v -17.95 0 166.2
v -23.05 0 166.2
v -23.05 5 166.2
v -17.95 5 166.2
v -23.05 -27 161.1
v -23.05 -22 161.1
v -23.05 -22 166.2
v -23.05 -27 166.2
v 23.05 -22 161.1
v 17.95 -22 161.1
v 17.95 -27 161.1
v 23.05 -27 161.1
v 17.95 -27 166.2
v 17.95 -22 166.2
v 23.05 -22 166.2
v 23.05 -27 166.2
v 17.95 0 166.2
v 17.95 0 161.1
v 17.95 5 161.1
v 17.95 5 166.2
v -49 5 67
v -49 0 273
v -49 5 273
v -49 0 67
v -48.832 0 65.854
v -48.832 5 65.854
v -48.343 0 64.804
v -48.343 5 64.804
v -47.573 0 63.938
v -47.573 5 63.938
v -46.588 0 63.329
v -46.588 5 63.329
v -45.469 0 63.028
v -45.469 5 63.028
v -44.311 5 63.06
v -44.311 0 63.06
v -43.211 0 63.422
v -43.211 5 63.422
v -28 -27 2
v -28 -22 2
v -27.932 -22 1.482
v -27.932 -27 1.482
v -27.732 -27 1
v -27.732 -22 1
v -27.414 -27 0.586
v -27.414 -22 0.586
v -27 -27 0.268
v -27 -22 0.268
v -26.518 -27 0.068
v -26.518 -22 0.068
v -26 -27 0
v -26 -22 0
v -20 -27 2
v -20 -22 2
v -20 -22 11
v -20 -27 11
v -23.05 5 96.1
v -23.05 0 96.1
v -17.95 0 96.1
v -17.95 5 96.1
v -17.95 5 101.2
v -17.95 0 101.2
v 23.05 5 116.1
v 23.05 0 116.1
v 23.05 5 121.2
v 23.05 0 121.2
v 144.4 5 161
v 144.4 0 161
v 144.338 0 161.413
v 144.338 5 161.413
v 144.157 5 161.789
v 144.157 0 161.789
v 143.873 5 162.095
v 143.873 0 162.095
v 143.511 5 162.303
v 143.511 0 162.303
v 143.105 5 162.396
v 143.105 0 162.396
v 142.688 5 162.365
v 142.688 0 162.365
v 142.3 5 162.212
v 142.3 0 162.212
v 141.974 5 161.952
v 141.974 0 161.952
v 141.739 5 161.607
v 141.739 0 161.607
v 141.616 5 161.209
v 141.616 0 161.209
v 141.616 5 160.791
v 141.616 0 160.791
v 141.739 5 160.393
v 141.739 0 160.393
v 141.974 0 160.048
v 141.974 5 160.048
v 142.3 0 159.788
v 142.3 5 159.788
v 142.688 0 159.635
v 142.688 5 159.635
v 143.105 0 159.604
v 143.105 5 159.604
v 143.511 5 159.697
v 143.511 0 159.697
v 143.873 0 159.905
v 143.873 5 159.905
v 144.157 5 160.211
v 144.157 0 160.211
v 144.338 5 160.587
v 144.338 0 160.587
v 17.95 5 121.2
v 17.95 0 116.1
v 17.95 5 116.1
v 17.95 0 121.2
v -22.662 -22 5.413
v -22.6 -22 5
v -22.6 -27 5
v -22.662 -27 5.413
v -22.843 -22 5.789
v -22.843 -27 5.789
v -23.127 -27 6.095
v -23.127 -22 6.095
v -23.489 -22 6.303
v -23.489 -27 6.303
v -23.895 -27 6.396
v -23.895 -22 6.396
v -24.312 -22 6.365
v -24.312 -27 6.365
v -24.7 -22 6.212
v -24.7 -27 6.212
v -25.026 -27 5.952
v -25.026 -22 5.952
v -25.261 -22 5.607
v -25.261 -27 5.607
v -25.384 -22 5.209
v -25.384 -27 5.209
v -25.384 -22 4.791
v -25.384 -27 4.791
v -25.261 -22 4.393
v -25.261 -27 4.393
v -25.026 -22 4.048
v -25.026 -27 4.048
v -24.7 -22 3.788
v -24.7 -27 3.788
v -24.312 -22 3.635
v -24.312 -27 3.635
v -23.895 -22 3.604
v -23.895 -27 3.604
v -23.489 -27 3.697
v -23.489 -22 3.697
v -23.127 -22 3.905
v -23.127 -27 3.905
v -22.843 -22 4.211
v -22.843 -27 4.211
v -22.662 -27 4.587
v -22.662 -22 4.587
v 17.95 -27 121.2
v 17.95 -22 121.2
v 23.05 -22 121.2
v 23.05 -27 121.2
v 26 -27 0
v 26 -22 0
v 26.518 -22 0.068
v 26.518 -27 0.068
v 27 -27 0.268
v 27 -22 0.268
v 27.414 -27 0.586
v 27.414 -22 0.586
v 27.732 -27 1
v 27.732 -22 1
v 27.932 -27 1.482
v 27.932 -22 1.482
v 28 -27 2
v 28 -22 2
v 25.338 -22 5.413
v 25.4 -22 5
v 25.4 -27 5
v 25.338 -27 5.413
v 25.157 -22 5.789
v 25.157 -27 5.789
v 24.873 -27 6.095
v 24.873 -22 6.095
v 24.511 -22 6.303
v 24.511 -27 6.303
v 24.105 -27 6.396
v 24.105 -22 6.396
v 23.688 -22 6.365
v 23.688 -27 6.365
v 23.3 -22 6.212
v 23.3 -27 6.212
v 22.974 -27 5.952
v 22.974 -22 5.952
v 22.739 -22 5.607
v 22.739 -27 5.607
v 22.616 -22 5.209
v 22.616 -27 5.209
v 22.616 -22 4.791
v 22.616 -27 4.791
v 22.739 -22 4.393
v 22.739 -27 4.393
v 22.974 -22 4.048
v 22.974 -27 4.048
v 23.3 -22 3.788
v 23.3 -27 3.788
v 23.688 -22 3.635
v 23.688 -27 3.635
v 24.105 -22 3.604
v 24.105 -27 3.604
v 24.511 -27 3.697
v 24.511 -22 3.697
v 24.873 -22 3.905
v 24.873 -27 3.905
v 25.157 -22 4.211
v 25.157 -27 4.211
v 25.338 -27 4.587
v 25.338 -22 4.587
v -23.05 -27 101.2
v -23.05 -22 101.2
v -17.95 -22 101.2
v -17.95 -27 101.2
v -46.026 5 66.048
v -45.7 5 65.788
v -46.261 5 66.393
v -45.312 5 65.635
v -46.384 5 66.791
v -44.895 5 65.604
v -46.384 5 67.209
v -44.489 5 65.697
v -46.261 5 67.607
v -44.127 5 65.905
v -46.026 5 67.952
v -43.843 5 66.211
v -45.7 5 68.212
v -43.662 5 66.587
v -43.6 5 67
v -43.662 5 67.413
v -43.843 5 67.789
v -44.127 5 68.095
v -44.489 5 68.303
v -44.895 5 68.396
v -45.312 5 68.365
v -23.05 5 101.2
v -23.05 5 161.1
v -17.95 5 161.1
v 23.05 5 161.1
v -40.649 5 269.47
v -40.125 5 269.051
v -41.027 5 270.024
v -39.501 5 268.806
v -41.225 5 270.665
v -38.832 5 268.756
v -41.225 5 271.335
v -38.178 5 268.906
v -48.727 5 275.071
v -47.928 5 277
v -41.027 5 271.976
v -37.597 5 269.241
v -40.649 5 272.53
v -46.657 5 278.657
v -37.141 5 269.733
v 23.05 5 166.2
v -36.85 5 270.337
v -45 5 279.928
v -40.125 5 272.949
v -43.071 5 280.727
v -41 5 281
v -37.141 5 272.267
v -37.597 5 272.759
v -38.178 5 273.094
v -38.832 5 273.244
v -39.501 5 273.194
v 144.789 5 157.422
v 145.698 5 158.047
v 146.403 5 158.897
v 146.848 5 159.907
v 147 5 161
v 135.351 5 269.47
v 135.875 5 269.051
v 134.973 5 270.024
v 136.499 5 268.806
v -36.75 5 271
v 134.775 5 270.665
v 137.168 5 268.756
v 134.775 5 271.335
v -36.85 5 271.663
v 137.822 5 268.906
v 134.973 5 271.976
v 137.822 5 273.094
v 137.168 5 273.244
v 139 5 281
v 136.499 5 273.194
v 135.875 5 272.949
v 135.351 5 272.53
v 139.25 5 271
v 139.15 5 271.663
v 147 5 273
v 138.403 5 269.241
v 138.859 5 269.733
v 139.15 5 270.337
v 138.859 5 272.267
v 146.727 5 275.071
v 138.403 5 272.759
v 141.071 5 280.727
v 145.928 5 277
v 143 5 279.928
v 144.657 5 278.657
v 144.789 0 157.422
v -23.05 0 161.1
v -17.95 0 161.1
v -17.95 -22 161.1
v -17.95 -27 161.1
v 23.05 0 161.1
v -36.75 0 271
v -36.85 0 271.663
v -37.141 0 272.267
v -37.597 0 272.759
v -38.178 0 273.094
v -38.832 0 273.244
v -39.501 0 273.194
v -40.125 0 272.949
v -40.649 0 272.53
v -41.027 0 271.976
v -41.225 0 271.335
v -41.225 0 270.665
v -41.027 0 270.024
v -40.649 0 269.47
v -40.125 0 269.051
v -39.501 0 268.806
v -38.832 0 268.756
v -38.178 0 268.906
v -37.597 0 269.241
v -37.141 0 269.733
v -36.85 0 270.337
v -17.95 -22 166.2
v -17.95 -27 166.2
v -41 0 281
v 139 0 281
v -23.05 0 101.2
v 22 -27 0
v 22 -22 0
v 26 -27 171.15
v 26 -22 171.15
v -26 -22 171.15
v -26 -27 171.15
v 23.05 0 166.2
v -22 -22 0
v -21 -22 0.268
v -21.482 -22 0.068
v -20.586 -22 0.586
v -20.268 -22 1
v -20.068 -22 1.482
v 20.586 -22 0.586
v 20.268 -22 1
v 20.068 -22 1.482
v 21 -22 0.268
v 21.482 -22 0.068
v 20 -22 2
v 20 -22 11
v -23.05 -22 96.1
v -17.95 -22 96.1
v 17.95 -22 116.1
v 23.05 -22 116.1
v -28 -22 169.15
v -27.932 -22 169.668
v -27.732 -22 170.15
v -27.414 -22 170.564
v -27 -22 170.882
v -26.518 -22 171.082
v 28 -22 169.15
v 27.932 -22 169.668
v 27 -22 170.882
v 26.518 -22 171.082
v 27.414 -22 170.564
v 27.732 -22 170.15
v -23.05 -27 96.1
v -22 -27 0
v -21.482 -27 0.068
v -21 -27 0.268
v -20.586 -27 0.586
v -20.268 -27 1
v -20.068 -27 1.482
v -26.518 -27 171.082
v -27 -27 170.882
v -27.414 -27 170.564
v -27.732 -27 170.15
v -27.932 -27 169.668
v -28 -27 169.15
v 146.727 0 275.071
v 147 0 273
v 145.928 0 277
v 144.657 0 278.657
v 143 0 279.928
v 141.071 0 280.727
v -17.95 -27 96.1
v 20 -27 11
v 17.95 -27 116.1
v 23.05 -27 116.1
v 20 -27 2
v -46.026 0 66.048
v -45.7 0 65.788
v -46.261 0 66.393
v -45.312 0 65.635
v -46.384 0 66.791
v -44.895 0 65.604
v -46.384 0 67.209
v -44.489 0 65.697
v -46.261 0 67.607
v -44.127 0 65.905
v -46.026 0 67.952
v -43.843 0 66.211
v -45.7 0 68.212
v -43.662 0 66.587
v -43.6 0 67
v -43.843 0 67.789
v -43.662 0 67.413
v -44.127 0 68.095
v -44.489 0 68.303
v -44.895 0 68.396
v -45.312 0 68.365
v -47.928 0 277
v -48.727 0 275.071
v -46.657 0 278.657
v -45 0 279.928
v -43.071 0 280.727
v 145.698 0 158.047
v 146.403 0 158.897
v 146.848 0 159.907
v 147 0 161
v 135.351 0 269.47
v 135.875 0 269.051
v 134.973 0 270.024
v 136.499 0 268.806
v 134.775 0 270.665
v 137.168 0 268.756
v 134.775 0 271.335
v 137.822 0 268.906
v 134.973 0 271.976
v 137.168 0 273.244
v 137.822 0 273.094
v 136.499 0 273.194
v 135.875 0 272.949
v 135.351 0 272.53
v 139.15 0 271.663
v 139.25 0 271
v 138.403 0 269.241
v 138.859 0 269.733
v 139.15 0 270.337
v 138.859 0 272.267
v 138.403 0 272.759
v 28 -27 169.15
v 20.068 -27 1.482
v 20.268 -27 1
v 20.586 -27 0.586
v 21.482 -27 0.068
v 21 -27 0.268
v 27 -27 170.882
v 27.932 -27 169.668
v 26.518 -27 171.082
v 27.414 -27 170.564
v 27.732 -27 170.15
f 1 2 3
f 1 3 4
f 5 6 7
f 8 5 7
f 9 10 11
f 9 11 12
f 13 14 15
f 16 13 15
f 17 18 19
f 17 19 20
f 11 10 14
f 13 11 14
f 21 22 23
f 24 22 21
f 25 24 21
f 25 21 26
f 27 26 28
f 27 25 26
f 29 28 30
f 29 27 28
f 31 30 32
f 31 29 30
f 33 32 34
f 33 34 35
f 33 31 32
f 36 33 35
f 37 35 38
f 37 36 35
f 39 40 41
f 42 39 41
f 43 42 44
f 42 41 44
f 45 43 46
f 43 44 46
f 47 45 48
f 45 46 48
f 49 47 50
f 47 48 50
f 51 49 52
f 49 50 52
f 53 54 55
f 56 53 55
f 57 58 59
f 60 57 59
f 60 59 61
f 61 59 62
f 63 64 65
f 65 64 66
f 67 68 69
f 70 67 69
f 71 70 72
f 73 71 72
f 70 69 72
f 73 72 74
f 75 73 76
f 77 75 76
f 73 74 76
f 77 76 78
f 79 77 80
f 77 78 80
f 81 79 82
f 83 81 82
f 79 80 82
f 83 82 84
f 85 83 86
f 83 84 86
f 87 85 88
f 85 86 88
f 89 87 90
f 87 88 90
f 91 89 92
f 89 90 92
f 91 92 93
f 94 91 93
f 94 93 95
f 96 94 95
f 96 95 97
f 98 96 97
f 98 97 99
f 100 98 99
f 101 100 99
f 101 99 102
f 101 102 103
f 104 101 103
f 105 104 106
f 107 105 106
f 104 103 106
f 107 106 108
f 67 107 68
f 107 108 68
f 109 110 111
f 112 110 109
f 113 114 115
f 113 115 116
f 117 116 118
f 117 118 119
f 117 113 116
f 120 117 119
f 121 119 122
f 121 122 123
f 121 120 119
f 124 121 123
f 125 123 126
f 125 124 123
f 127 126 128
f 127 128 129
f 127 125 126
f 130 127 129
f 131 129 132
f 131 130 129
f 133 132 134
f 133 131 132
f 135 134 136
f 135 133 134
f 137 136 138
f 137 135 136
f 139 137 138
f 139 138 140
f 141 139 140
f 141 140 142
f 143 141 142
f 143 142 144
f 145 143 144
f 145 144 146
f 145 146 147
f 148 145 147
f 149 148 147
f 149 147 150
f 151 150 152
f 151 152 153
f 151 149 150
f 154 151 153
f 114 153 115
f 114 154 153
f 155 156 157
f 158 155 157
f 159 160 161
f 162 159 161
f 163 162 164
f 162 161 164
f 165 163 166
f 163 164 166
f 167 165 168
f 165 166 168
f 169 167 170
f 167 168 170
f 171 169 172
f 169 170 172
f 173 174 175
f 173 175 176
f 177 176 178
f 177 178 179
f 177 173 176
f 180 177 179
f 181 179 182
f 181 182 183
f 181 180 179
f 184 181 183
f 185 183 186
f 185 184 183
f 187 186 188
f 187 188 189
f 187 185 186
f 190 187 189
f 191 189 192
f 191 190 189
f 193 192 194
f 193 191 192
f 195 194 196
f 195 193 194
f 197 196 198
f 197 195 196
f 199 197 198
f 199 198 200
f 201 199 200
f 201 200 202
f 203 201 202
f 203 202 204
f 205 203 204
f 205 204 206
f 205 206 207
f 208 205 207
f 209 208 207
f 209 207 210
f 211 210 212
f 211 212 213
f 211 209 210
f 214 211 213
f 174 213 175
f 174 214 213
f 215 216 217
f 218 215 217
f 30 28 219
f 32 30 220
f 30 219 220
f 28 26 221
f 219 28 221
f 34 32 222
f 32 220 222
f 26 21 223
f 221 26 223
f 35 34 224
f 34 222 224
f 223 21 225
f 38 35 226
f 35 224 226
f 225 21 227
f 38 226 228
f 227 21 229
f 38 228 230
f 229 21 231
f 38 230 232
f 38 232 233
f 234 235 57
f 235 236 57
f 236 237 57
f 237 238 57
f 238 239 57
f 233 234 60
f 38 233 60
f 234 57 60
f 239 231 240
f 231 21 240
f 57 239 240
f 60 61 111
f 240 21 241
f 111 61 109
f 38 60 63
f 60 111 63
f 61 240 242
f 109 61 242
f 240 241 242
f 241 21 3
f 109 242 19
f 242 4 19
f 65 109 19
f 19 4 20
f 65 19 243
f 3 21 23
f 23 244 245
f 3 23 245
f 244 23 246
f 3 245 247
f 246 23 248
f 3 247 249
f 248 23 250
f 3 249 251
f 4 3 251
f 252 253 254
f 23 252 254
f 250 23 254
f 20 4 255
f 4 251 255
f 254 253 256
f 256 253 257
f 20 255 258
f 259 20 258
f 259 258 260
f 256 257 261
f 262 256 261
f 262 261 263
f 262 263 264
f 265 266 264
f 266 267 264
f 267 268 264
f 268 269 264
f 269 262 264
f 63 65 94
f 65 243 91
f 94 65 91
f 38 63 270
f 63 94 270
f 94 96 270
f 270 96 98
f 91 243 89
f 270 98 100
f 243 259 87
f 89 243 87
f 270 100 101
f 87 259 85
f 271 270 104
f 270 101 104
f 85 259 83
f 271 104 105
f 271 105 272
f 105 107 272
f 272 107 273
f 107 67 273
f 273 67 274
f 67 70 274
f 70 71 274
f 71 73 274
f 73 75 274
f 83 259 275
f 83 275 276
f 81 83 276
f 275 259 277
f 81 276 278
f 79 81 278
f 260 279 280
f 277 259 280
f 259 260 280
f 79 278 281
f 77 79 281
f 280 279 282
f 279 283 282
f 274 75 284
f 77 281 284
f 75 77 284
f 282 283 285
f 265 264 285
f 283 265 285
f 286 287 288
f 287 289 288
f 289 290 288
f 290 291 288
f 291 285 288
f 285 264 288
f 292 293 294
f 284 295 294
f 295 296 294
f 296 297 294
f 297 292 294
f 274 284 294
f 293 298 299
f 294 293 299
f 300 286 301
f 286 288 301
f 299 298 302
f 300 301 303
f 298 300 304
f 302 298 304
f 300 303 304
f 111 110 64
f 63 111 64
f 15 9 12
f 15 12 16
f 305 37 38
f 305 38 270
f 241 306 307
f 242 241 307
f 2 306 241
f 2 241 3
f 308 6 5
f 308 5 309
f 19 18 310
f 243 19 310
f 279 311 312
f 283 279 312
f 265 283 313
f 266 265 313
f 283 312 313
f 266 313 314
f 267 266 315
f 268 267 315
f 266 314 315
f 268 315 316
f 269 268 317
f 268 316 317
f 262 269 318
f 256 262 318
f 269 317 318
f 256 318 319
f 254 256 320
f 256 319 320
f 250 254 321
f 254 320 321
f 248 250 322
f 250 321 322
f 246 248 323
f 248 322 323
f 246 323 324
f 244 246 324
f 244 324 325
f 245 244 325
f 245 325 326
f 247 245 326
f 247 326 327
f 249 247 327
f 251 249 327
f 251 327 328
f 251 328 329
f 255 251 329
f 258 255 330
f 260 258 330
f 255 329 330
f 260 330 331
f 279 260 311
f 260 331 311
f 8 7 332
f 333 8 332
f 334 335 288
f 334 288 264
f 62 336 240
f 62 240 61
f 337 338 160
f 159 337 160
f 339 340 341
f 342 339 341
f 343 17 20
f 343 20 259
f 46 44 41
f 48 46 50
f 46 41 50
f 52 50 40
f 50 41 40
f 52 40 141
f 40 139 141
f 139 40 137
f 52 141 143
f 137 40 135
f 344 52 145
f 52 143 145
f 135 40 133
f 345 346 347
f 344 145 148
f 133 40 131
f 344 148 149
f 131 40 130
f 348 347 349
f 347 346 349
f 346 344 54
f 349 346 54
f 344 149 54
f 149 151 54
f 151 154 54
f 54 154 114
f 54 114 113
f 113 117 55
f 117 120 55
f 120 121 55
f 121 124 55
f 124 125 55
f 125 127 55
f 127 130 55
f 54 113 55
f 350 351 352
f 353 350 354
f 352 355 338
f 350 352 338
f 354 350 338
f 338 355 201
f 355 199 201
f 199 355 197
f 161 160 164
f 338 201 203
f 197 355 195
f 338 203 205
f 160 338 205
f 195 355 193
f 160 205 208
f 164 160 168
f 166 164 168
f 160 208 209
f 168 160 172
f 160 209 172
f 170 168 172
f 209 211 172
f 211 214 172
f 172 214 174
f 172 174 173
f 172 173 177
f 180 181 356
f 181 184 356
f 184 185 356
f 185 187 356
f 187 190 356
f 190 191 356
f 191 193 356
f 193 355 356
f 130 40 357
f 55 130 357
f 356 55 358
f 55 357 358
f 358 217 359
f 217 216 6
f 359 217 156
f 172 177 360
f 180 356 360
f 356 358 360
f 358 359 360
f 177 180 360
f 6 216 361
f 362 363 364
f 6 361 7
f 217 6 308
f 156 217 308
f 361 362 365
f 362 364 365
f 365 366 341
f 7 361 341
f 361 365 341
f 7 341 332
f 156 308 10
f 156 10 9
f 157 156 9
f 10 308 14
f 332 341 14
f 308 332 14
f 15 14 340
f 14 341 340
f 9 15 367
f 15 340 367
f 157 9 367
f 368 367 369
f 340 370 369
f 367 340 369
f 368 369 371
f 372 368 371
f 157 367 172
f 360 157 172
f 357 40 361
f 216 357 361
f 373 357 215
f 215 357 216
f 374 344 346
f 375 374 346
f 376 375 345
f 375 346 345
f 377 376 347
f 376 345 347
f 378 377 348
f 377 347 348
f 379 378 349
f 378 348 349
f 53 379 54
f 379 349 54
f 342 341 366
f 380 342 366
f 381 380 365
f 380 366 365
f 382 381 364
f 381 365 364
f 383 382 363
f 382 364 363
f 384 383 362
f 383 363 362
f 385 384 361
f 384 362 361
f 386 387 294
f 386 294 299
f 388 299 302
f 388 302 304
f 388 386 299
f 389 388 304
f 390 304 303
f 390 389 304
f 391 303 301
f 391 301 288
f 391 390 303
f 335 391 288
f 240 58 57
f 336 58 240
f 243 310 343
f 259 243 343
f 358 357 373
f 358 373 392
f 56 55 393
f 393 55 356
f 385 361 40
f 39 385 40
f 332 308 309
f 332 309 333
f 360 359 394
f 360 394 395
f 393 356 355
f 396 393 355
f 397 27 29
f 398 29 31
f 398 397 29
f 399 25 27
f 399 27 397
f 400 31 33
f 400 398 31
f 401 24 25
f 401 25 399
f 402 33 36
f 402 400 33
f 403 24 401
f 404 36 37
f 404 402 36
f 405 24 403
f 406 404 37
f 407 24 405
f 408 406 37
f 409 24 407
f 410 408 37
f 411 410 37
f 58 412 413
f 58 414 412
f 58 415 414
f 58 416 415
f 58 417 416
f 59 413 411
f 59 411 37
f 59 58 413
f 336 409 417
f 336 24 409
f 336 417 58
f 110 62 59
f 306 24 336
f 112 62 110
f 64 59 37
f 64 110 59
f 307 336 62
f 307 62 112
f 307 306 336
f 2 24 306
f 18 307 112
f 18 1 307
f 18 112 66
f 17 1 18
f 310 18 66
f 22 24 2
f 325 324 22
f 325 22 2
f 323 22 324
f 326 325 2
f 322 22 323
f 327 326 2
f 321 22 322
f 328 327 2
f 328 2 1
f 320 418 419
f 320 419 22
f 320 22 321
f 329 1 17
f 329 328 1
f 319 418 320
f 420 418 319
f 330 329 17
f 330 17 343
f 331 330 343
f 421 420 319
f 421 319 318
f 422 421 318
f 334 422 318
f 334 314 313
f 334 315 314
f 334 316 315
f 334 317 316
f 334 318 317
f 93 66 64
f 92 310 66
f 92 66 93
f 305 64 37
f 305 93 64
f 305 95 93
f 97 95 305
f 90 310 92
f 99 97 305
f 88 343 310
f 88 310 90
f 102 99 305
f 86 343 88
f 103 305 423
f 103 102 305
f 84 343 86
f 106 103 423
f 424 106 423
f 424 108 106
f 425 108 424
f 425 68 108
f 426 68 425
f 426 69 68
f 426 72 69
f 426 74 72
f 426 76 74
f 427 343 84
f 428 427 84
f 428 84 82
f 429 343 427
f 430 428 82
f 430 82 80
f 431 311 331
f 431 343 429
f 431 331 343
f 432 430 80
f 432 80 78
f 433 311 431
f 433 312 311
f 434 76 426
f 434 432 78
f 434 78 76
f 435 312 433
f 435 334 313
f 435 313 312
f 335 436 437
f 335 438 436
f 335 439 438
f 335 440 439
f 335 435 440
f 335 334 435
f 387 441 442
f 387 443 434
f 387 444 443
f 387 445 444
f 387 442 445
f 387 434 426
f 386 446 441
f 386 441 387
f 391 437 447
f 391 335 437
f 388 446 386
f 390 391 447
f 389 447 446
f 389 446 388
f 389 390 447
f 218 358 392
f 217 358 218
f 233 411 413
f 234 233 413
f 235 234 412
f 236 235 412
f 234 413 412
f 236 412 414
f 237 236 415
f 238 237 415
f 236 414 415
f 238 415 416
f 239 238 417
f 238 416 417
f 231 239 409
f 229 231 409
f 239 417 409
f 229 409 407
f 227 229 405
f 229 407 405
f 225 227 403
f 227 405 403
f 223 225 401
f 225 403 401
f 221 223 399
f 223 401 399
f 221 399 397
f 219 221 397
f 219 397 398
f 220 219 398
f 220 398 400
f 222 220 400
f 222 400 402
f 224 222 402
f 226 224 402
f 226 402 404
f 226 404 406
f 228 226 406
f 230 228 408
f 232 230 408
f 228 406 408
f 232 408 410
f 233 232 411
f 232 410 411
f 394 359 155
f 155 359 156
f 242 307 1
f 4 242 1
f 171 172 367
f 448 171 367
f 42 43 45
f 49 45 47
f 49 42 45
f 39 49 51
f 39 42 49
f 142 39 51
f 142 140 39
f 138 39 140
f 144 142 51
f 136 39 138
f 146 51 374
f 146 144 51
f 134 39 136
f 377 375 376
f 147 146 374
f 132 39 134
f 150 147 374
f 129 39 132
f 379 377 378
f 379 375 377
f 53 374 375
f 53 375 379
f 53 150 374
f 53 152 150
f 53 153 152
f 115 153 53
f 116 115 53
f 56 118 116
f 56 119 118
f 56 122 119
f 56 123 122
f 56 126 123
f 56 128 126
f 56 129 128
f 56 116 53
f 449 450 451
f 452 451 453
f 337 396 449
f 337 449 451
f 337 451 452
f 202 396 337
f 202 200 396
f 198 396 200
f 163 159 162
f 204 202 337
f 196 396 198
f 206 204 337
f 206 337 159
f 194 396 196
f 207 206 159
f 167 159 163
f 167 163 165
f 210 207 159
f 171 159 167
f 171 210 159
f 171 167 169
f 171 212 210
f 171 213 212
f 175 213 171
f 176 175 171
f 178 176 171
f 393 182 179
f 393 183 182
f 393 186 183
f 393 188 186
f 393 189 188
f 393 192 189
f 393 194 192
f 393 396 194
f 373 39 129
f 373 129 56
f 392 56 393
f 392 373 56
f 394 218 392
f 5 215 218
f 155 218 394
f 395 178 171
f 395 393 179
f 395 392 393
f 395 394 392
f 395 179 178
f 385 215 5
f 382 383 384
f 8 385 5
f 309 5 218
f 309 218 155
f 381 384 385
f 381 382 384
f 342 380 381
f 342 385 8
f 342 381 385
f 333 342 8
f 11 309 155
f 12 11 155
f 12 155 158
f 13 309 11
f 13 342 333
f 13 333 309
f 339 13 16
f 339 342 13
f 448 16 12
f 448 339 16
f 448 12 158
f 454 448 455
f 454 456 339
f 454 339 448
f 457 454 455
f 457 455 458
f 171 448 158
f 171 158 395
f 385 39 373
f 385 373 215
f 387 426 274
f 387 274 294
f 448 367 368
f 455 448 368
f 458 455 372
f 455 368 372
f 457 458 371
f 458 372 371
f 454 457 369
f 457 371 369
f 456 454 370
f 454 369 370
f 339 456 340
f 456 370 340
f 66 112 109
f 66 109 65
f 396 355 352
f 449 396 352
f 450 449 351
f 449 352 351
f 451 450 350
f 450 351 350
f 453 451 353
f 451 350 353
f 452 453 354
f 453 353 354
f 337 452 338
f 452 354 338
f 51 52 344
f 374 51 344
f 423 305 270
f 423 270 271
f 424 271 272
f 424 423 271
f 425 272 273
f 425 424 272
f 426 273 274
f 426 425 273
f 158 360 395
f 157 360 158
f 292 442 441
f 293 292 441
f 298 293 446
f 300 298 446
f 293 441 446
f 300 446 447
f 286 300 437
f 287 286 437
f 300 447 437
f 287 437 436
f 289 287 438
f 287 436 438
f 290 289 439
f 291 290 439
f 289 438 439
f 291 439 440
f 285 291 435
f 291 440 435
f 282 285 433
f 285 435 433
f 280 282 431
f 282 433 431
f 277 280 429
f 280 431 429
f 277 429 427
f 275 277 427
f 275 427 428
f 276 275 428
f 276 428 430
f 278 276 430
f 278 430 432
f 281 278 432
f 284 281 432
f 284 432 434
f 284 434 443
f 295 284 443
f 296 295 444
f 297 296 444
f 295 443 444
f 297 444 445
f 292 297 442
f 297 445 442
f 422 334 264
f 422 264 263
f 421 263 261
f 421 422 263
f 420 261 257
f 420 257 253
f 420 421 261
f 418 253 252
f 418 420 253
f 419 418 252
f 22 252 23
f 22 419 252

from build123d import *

# Parameters (mm, degrees)
F0_R     = 1.4
F0_W     = 5.1
F0_H     = 5.1
F0_R_2   = 2.25
F3_DEPTH = 5
F2_R     = 1.4
F2_W     = 5.1
F2_H     = 5.1
F4_DEPTH = 5


with BuildPart() as f3:
    # F0 (on Front) → F3 (new body)
    with BuildSketch(Plane.XZ):
        with BuildLine():
            Line((-43.211146, 63.422291), (144.788854, 157.422291))
            ThreePointArc((144.788854, 157.422291), (146.402603, 158.897076), (147, 161))
            Line((147, 161), (147, 273))
            ThreePointArc((147, 273), (144.656854, 278.656854), (139, 281))
            Line((139, 281), (-41, 281))
            ThreePointArc((-41, 281), (-46.656854, 278.656854), (-49, 273))
            Line((-49, 273), (-49, 67))
            ThreePointArc((-49, 67), (-47.102924, 63.597397), (-43.211146, 63.422291))
        make_face()
        with Locations((-45, 67)):
            Circle(F0_R, mode=Mode.SUBTRACT)
        with Locations((-20.5, 98.65)):
            Rectangle(F0_W, F0_H, mode=Mode.SUBTRACT)
        with Locations((-20.5, 163.65)):
            Rectangle(F0_W, F0_H, mode=Mode.SUBTRACT)
        with Locations((20.5, 118.65)):
            Rectangle(F0_W, F0_H, mode=Mode.SUBTRACT)
        with Locations((20.5, 163.65)):
            Rectangle(F0_W, F0_H, mode=Mode.SUBTRACT)
        with Locations((143, 161)):
            Circle(F0_R, mode=Mode.SUBTRACT)
        with Locations((-39, 271)):
            Circle(F0_R_2, mode=Mode.SUBTRACT)
        with Locations((137, 271)):
            Circle(F0_R_2, mode=Mode.SUBTRACT)
    extrude(amount=-F3_DEPTH)


with BuildPart() as f4:
    # F2 (on offset) → F4 (new body)
    with BuildSketch(Plane.XZ.offset(22)):
        with BuildLine():
            ThreePointArc((-28, 2), (-27.414214, 0.585786), (-26, 0))
            Line((-26, 0), (-22, 0))
            ThreePointArc((-22, 0), (-20.585786, 0.585786), (-20, 2))
            Line((-20, 2), (-20, 11))
            Line((-20, 11), (20, 11))
            Line((20, 11), (20, 2))
            ThreePointArc((20, 2), (20.585786, 0.585786), (22, 0))
            Line((22, 0), (26, 0))
            ThreePointArc((26, 0), (27.414214, 0.585786), (28, 2))
            Line((28, 2), (28, 169.15))
            ThreePointArc((28, 169.15), (27.414214, 170.564214), (26, 171.15))
            Line((26, 171.15), (-26, 171.15))
            ThreePointArc((-26, 171.15), (-27.414214, 170.564214), (-28, 169.15))
            Line((-28, 169.15), (-28, 2))
        make_face()
        with Locations((-24, 5)):
            Circle(F2_R, mode=Mode.SUBTRACT)
        with Locations((24, 5)):
            Circle(F2_R, mode=Mode.SUBTRACT)
        with Locations((-20.5, 98.65)):
            Rectangle(F2_W, F2_H, mode=Mode.SUBTRACT)
        with Locations((-20.5, 163.65)):
            Rectangle(F2_W, F2_H, mode=Mode.SUBTRACT)
        with Locations((20.5, 118.65)):
            Rectangle(F2_W, F2_H, mode=Mode.SUBTRACT)
        with Locations((20.5, 163.65)):
            Rectangle(F2_W, F2_H, mode=Mode.SUBTRACT)
    extrude(amount=F4_DEPTH)


solid = Compound([f3.part, f4.part])
